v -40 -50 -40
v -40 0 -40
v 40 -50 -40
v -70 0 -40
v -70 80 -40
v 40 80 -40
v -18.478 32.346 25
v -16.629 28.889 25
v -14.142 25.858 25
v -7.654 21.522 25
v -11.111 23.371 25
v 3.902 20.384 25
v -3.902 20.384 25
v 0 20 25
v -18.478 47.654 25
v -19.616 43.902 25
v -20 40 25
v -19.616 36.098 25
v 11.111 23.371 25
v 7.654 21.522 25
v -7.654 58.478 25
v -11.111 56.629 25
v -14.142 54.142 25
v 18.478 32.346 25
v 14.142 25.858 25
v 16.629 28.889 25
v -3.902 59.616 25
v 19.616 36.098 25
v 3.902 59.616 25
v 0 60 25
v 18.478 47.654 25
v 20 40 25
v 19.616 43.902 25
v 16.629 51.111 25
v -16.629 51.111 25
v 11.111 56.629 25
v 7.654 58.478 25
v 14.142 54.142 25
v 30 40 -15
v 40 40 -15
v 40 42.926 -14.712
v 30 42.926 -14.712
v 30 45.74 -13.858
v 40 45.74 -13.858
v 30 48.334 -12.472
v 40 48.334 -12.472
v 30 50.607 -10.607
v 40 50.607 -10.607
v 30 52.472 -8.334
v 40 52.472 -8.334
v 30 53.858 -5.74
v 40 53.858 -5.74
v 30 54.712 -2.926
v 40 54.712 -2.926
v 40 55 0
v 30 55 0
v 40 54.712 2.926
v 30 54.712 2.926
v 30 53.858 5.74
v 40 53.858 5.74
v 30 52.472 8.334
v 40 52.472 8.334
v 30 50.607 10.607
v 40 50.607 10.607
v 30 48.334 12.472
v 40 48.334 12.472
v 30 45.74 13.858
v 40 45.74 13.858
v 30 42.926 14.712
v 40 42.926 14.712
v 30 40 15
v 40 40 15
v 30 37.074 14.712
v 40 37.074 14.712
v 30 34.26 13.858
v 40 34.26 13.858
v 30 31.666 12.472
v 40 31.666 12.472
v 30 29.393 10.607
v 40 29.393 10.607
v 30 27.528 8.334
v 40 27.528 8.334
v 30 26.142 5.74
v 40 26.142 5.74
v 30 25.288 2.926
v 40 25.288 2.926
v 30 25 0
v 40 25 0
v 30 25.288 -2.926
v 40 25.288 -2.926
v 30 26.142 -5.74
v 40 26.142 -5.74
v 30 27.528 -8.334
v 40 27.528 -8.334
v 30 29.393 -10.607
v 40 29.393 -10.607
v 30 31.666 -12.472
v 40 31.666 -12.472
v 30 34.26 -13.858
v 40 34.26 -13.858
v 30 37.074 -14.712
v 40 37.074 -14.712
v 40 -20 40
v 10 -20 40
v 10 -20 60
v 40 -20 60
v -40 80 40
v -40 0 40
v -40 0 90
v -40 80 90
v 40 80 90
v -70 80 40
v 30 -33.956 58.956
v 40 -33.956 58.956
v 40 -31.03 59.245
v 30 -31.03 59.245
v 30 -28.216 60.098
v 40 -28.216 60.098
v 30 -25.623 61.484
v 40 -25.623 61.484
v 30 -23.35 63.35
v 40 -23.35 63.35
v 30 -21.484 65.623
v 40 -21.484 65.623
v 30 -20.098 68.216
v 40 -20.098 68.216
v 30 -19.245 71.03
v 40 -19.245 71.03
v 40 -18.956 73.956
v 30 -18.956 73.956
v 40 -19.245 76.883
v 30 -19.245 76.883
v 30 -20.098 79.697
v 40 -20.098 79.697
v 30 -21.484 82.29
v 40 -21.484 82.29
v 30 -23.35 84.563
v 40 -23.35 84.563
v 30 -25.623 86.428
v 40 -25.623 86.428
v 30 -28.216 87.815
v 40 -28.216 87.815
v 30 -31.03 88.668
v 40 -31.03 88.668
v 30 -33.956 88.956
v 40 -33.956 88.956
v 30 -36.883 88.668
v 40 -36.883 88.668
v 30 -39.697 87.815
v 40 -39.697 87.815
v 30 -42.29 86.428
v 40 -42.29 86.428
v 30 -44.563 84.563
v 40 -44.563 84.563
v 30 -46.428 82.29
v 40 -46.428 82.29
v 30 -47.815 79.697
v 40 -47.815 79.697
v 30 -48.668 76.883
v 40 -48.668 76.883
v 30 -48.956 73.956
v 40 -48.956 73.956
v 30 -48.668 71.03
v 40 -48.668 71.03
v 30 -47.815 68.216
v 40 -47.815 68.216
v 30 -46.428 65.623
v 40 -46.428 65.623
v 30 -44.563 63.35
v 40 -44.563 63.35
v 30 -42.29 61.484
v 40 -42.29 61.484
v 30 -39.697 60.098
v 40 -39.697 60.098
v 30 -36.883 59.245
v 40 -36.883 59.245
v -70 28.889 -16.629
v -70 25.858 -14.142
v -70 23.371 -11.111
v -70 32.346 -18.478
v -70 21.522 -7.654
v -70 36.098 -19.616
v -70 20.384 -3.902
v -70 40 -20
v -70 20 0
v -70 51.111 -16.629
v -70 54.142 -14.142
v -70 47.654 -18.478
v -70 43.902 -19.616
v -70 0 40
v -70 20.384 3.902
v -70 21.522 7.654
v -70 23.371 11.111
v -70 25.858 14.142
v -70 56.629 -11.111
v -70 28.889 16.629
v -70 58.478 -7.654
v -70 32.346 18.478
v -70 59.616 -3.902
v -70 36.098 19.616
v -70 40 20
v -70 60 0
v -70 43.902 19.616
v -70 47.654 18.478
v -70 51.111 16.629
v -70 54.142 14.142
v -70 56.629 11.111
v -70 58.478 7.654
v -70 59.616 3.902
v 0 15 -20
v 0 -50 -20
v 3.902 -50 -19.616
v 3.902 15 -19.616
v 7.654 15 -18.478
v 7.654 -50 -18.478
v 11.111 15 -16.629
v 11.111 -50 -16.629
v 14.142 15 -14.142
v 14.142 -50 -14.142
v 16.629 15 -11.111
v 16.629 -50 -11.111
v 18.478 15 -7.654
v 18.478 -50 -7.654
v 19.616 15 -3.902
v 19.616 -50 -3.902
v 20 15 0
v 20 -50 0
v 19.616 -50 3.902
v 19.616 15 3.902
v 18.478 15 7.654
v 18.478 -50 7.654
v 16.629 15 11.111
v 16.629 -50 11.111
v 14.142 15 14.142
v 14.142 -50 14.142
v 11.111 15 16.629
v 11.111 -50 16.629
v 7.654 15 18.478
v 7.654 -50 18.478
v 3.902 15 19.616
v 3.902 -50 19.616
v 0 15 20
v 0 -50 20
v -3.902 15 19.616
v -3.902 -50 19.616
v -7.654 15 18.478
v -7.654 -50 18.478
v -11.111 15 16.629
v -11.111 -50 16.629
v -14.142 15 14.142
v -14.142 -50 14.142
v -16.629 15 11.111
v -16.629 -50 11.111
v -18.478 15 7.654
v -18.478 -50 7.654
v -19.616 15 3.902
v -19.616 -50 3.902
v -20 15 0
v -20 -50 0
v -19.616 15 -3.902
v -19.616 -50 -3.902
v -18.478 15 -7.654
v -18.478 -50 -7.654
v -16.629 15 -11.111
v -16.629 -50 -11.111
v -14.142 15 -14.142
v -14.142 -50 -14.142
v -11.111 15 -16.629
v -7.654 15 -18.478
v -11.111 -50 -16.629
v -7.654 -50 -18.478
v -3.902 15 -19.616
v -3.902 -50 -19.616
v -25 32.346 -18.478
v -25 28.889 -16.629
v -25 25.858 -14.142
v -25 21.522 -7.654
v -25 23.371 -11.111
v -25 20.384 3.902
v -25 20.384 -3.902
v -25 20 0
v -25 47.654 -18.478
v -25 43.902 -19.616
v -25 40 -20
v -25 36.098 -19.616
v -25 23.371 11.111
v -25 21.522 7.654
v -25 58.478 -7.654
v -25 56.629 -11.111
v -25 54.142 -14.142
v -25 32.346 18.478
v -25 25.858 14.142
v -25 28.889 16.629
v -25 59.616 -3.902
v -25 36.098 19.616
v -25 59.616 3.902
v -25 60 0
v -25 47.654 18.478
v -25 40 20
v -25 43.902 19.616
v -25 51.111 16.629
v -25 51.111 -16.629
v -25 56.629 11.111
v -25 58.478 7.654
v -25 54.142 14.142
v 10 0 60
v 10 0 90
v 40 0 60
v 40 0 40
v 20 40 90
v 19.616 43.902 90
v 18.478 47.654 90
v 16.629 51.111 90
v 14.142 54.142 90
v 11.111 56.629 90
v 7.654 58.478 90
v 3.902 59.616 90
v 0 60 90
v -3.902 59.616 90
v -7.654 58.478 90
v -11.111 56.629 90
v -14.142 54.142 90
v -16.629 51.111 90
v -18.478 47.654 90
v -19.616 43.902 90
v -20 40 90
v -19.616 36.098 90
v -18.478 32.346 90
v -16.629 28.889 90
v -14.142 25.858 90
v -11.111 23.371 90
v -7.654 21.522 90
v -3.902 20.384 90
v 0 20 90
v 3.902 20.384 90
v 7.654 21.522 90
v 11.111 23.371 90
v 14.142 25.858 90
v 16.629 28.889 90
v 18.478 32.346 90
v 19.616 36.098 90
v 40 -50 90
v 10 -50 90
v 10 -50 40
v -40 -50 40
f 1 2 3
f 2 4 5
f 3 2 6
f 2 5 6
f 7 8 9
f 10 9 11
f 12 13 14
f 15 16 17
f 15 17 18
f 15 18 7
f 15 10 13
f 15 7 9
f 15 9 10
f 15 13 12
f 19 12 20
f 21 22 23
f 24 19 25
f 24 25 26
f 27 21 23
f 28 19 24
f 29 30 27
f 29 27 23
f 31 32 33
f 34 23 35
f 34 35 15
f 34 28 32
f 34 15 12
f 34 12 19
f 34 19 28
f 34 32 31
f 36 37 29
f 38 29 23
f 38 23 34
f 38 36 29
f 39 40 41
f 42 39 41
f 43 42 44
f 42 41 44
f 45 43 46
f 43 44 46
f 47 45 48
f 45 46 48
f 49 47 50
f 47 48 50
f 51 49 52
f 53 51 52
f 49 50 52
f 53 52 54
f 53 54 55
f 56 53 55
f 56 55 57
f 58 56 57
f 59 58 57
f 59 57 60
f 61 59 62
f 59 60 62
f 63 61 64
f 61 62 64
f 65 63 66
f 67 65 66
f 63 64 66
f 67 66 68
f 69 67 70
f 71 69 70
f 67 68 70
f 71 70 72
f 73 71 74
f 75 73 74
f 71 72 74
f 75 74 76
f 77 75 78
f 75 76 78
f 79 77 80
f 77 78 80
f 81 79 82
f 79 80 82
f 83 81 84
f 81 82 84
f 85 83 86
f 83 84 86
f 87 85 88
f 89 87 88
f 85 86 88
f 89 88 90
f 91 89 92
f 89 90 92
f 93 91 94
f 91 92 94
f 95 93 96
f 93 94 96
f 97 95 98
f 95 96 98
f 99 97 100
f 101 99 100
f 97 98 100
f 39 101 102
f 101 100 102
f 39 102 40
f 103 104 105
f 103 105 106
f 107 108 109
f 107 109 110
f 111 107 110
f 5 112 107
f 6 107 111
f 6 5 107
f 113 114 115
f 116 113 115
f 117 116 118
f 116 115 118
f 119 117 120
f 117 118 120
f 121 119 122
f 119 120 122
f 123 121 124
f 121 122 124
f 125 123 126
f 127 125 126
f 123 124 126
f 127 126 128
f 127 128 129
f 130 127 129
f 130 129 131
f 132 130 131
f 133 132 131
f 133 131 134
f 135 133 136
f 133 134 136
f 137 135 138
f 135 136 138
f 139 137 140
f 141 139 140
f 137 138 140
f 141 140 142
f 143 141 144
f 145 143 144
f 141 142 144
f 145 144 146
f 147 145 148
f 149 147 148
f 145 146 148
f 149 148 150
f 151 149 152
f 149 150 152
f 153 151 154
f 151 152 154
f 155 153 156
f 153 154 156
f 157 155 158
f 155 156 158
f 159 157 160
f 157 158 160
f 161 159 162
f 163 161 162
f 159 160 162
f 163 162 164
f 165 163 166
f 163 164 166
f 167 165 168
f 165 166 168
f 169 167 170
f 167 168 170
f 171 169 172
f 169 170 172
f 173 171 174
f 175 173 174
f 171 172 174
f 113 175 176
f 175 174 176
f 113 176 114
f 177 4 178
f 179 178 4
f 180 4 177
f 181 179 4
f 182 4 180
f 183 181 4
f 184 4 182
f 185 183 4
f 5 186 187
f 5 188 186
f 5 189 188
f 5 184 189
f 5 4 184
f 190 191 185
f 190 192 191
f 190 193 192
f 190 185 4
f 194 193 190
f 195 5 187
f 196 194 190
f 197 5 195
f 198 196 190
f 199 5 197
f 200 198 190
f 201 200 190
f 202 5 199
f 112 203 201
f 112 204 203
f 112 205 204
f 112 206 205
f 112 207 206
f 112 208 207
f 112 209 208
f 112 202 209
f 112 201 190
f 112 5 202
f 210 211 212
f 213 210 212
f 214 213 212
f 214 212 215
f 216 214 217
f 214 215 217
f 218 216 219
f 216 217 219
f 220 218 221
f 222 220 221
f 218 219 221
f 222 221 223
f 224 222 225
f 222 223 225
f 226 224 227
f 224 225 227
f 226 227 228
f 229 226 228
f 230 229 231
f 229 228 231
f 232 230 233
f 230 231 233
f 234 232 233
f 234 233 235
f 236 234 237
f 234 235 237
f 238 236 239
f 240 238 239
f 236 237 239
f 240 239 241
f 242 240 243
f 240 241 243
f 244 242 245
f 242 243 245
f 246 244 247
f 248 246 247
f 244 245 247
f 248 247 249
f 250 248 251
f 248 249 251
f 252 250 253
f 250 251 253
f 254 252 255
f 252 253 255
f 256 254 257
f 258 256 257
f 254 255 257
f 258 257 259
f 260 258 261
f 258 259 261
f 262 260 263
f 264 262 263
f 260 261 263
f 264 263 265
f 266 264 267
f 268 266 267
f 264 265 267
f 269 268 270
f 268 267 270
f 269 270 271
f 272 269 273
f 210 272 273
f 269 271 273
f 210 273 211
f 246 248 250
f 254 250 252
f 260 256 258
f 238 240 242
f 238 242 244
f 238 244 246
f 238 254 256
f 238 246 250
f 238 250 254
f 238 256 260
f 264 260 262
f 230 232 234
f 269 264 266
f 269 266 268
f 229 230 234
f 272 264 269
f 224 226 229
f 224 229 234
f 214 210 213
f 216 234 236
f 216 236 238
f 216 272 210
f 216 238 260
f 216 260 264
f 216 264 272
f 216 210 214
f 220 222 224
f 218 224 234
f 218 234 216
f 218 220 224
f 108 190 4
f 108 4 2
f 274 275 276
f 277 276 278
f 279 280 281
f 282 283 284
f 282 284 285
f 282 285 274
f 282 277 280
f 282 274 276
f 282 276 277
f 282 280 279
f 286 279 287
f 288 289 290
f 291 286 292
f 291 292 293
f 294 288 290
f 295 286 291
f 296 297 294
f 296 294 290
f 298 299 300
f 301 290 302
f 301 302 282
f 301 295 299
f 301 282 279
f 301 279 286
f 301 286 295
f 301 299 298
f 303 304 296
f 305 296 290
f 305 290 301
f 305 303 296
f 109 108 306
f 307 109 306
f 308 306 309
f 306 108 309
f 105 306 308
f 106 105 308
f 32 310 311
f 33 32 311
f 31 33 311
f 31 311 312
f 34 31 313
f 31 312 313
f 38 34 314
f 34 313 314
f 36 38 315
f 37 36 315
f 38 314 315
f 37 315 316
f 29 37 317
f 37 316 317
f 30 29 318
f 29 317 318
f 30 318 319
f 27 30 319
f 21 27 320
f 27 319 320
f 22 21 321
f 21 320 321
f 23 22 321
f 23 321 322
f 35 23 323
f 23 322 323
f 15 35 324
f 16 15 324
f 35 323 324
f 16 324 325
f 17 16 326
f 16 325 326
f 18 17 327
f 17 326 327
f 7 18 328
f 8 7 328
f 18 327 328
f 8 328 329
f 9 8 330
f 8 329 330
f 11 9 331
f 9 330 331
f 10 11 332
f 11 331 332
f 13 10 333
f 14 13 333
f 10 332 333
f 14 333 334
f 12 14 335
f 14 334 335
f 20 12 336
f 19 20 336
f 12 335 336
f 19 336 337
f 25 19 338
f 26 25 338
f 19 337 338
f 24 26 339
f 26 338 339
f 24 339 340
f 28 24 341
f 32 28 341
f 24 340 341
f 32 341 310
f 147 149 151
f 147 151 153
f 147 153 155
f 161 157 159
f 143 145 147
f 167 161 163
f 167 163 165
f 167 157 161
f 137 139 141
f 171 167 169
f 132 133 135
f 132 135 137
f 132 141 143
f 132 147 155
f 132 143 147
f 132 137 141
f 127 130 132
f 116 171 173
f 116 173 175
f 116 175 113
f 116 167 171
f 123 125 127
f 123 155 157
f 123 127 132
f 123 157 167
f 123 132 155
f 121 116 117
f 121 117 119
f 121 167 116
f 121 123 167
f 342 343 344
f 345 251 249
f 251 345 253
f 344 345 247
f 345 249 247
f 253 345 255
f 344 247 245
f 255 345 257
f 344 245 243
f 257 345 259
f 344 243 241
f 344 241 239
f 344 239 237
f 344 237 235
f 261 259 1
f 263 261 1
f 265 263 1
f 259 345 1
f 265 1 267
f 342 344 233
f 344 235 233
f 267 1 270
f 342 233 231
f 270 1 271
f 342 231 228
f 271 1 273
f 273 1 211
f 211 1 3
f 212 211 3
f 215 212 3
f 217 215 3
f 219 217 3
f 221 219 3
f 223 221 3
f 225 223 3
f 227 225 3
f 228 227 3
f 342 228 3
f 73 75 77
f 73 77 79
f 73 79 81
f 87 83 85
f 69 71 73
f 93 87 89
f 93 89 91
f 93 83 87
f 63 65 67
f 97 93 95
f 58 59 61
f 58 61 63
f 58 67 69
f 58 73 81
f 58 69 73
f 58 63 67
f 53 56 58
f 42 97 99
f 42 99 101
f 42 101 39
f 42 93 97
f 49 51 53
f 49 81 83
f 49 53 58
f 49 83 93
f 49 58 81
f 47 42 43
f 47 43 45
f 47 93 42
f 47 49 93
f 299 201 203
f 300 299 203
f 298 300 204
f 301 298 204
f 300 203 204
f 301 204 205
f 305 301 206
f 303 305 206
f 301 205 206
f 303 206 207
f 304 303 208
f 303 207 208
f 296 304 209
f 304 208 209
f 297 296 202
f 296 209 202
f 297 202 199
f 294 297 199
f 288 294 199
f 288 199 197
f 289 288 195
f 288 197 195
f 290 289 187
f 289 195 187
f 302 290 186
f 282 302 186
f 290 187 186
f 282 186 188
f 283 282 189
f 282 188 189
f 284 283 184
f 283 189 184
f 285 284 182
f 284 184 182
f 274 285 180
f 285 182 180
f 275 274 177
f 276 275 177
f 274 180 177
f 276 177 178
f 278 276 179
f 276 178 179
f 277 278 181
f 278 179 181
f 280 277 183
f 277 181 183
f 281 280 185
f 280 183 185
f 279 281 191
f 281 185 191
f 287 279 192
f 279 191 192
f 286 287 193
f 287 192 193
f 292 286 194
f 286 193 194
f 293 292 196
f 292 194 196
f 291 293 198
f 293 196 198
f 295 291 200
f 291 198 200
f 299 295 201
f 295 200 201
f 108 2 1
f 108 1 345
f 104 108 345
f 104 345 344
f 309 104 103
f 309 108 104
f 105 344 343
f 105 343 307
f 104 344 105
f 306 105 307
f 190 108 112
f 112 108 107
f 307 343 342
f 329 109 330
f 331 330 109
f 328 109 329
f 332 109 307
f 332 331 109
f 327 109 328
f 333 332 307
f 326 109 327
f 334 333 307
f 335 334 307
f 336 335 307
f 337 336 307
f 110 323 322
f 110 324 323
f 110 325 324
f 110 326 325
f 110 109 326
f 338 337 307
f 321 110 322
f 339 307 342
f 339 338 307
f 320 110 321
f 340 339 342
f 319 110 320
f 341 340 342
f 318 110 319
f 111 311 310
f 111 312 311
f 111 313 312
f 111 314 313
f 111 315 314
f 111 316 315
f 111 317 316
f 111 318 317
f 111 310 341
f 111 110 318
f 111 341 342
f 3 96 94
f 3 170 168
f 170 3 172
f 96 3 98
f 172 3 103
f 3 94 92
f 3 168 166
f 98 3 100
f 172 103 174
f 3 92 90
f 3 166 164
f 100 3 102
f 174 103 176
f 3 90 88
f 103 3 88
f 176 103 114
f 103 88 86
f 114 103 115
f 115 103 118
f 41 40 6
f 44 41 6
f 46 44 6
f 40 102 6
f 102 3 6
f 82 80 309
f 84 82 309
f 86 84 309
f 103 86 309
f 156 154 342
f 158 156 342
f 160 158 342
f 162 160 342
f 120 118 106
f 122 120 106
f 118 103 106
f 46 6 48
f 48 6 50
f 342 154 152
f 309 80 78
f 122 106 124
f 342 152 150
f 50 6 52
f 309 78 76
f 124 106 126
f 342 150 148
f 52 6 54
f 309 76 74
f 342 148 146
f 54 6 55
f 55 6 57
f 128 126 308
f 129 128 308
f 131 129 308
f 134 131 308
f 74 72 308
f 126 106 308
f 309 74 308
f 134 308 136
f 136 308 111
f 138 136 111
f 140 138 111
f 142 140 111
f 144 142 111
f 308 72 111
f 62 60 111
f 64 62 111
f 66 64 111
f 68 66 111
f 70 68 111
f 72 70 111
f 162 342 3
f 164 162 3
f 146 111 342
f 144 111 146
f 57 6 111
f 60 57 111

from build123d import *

# Parameters (mm, degrees)
ESQUISSE2_W             = 80
ESQUISSE2_H             = 80
BOSS_EXTRU_1_DEPTH      = 80
ESQUISSE5_W             = 80
ESQUISSE5_H             = 80
BOSS_EXTRU_2_DEPTH      = 30
ESQUISSE6_W             = 80
ESQUISSE6_H             = 80
BOSS_EXTRU_3_DEPTH      = 50
ESQUISSE7_W             = 80
ESQUISSE7_H             = 80
BOSS_EXTRU_4_DEPTH      = 50
ESQUISSE8_R             = 20
ENL_V_MAT_EXTRU_1_DEPTH = 45
ESQUISSE9_R             = 20
ENL_V_MAT_EXTRU_2_DEPTH = 65
ESQUISSE10_R            = 20
ENL_V_MAT_EXTRU_3_DEPTH = 65
ESQUISSE16_W            = 30
ESQUISSE16_H            = 30
BOSS_EXTRU_9_DEPTH      = 50
ESQUISSE17_W            = 30
ESQUISSE17_H            = 30
BOSS_EXTRU_10_DEPTH     = 50
ESQUISSE19_R            = 15
ENL_V_MAT_EXTRU_4_DEPTH = 10


with BuildPart() as part:
    # Esquisse2 → Boss.-Extru.1 (new body)
    with BuildSketch(Plane(origin=(0, 0, 0), x_dir=(1, 0, 0), z_dir=(0, 1, 0))):
        Rectangle(ESQUISSE2_W, ESQUISSE2_H)
    extrude(amount=BOSS_EXTRU_1_DEPTH)

    # Esquisse5 → Boss.-Extru.2 (add)
    with BuildSketch(Plane.ZY.offset(40)):
        with Locations((0, 40)):
            Rectangle(ESQUISSE5_W, ESQUISSE5_H)
    extrude(amount=BOSS_EXTRU_2_DEPTH)

    # Esquisse6 → Boss.-Extru.3 (add)
    with BuildSketch(Plane.XY.offset(40)):
        with Locations((0, 40)):
            Rectangle(ESQUISSE6_W, ESQUISSE6_H)
    extrude(amount=BOSS_EXTRU_3_DEPTH)

    # Esquisse7 → Boss.-Extru.4 (add)
    with BuildSketch(Plane.XZ):
        Rectangle(ESQUISSE7_W, ESQUISSE7_H)
    extrude(amount=BOSS_EXTRU_4_DEPTH)

    # Esquisse8 → Enlèv. mat.-Extru.1 (cut)
    with BuildSketch(Plane.ZY.offset(70)):
        with Locations((0, 40)):
            Circle(ESQUISSE8_R)
    extrude(amount=-ENL_V_MAT_EXTRU_1_DEPTH, mode=Mode.SUBTRACT)

    # Esquisse9 → Enlèv. mat.-Extru.2 (cut)
    with BuildSketch(Plane.XY.offset(90)):
        with Locations((0, 40)):
            Circle(ESQUISSE9_R)
    extrude(amount=-ENL_V_MAT_EXTRU_2_DEPTH, mode=Mode.SUBTRACT)

    # Esquisse10 → Enlèv. mat.-Extru.3 (cut)
    with BuildSketch(Plane.XZ.offset(50)):
        with Locations(Location((0, 0, 0), (0, 0, 270))):
            Circle(ESQUISSE10_R)
    extrude(amount=-ENL_V_MAT_EXTRU_3_DEPTH, mode=Mode.SUBTRACT)

    # Esquisse16 → Boss.-Extru.9 (add)
    with BuildSketch(Plane.XZ):
        with Locations((25, 75)):
            Rectangle(ESQUISSE16_W, ESQUISSE16_H)
    extrude(amount=BOSS_EXTRU_9_DEPTH)

    # Esquisse17 → Boss.-Extru.10 (add)
    with BuildSketch(Plane.XY.offset(40)):
        with Locations((25, -35)):
            Rectangle(ESQUISSE17_W, ESQUISSE17_H)
    extrude(amount=BOSS_EXTRU_10_DEPTH)

    # Esquisse19 → Enlèv. mat.-Extru.4 (cut)
    with BuildSketch(Plane(origin=(40, 0, 0), x_dir=(0, 0, -1), z_dir=(1, 0, 0))):
        with Locations((-73.956364881, -33.956364881)):
            Circle(ESQUISSE19_R)
        with Locations((0, 40)):
            Circle(ESQUISSE19_R)
    extrude(amount=-ENL_V_MAT_EXTRU_4_DEPTH, mode=Mode.SUBTRACT)


solid = part.part
